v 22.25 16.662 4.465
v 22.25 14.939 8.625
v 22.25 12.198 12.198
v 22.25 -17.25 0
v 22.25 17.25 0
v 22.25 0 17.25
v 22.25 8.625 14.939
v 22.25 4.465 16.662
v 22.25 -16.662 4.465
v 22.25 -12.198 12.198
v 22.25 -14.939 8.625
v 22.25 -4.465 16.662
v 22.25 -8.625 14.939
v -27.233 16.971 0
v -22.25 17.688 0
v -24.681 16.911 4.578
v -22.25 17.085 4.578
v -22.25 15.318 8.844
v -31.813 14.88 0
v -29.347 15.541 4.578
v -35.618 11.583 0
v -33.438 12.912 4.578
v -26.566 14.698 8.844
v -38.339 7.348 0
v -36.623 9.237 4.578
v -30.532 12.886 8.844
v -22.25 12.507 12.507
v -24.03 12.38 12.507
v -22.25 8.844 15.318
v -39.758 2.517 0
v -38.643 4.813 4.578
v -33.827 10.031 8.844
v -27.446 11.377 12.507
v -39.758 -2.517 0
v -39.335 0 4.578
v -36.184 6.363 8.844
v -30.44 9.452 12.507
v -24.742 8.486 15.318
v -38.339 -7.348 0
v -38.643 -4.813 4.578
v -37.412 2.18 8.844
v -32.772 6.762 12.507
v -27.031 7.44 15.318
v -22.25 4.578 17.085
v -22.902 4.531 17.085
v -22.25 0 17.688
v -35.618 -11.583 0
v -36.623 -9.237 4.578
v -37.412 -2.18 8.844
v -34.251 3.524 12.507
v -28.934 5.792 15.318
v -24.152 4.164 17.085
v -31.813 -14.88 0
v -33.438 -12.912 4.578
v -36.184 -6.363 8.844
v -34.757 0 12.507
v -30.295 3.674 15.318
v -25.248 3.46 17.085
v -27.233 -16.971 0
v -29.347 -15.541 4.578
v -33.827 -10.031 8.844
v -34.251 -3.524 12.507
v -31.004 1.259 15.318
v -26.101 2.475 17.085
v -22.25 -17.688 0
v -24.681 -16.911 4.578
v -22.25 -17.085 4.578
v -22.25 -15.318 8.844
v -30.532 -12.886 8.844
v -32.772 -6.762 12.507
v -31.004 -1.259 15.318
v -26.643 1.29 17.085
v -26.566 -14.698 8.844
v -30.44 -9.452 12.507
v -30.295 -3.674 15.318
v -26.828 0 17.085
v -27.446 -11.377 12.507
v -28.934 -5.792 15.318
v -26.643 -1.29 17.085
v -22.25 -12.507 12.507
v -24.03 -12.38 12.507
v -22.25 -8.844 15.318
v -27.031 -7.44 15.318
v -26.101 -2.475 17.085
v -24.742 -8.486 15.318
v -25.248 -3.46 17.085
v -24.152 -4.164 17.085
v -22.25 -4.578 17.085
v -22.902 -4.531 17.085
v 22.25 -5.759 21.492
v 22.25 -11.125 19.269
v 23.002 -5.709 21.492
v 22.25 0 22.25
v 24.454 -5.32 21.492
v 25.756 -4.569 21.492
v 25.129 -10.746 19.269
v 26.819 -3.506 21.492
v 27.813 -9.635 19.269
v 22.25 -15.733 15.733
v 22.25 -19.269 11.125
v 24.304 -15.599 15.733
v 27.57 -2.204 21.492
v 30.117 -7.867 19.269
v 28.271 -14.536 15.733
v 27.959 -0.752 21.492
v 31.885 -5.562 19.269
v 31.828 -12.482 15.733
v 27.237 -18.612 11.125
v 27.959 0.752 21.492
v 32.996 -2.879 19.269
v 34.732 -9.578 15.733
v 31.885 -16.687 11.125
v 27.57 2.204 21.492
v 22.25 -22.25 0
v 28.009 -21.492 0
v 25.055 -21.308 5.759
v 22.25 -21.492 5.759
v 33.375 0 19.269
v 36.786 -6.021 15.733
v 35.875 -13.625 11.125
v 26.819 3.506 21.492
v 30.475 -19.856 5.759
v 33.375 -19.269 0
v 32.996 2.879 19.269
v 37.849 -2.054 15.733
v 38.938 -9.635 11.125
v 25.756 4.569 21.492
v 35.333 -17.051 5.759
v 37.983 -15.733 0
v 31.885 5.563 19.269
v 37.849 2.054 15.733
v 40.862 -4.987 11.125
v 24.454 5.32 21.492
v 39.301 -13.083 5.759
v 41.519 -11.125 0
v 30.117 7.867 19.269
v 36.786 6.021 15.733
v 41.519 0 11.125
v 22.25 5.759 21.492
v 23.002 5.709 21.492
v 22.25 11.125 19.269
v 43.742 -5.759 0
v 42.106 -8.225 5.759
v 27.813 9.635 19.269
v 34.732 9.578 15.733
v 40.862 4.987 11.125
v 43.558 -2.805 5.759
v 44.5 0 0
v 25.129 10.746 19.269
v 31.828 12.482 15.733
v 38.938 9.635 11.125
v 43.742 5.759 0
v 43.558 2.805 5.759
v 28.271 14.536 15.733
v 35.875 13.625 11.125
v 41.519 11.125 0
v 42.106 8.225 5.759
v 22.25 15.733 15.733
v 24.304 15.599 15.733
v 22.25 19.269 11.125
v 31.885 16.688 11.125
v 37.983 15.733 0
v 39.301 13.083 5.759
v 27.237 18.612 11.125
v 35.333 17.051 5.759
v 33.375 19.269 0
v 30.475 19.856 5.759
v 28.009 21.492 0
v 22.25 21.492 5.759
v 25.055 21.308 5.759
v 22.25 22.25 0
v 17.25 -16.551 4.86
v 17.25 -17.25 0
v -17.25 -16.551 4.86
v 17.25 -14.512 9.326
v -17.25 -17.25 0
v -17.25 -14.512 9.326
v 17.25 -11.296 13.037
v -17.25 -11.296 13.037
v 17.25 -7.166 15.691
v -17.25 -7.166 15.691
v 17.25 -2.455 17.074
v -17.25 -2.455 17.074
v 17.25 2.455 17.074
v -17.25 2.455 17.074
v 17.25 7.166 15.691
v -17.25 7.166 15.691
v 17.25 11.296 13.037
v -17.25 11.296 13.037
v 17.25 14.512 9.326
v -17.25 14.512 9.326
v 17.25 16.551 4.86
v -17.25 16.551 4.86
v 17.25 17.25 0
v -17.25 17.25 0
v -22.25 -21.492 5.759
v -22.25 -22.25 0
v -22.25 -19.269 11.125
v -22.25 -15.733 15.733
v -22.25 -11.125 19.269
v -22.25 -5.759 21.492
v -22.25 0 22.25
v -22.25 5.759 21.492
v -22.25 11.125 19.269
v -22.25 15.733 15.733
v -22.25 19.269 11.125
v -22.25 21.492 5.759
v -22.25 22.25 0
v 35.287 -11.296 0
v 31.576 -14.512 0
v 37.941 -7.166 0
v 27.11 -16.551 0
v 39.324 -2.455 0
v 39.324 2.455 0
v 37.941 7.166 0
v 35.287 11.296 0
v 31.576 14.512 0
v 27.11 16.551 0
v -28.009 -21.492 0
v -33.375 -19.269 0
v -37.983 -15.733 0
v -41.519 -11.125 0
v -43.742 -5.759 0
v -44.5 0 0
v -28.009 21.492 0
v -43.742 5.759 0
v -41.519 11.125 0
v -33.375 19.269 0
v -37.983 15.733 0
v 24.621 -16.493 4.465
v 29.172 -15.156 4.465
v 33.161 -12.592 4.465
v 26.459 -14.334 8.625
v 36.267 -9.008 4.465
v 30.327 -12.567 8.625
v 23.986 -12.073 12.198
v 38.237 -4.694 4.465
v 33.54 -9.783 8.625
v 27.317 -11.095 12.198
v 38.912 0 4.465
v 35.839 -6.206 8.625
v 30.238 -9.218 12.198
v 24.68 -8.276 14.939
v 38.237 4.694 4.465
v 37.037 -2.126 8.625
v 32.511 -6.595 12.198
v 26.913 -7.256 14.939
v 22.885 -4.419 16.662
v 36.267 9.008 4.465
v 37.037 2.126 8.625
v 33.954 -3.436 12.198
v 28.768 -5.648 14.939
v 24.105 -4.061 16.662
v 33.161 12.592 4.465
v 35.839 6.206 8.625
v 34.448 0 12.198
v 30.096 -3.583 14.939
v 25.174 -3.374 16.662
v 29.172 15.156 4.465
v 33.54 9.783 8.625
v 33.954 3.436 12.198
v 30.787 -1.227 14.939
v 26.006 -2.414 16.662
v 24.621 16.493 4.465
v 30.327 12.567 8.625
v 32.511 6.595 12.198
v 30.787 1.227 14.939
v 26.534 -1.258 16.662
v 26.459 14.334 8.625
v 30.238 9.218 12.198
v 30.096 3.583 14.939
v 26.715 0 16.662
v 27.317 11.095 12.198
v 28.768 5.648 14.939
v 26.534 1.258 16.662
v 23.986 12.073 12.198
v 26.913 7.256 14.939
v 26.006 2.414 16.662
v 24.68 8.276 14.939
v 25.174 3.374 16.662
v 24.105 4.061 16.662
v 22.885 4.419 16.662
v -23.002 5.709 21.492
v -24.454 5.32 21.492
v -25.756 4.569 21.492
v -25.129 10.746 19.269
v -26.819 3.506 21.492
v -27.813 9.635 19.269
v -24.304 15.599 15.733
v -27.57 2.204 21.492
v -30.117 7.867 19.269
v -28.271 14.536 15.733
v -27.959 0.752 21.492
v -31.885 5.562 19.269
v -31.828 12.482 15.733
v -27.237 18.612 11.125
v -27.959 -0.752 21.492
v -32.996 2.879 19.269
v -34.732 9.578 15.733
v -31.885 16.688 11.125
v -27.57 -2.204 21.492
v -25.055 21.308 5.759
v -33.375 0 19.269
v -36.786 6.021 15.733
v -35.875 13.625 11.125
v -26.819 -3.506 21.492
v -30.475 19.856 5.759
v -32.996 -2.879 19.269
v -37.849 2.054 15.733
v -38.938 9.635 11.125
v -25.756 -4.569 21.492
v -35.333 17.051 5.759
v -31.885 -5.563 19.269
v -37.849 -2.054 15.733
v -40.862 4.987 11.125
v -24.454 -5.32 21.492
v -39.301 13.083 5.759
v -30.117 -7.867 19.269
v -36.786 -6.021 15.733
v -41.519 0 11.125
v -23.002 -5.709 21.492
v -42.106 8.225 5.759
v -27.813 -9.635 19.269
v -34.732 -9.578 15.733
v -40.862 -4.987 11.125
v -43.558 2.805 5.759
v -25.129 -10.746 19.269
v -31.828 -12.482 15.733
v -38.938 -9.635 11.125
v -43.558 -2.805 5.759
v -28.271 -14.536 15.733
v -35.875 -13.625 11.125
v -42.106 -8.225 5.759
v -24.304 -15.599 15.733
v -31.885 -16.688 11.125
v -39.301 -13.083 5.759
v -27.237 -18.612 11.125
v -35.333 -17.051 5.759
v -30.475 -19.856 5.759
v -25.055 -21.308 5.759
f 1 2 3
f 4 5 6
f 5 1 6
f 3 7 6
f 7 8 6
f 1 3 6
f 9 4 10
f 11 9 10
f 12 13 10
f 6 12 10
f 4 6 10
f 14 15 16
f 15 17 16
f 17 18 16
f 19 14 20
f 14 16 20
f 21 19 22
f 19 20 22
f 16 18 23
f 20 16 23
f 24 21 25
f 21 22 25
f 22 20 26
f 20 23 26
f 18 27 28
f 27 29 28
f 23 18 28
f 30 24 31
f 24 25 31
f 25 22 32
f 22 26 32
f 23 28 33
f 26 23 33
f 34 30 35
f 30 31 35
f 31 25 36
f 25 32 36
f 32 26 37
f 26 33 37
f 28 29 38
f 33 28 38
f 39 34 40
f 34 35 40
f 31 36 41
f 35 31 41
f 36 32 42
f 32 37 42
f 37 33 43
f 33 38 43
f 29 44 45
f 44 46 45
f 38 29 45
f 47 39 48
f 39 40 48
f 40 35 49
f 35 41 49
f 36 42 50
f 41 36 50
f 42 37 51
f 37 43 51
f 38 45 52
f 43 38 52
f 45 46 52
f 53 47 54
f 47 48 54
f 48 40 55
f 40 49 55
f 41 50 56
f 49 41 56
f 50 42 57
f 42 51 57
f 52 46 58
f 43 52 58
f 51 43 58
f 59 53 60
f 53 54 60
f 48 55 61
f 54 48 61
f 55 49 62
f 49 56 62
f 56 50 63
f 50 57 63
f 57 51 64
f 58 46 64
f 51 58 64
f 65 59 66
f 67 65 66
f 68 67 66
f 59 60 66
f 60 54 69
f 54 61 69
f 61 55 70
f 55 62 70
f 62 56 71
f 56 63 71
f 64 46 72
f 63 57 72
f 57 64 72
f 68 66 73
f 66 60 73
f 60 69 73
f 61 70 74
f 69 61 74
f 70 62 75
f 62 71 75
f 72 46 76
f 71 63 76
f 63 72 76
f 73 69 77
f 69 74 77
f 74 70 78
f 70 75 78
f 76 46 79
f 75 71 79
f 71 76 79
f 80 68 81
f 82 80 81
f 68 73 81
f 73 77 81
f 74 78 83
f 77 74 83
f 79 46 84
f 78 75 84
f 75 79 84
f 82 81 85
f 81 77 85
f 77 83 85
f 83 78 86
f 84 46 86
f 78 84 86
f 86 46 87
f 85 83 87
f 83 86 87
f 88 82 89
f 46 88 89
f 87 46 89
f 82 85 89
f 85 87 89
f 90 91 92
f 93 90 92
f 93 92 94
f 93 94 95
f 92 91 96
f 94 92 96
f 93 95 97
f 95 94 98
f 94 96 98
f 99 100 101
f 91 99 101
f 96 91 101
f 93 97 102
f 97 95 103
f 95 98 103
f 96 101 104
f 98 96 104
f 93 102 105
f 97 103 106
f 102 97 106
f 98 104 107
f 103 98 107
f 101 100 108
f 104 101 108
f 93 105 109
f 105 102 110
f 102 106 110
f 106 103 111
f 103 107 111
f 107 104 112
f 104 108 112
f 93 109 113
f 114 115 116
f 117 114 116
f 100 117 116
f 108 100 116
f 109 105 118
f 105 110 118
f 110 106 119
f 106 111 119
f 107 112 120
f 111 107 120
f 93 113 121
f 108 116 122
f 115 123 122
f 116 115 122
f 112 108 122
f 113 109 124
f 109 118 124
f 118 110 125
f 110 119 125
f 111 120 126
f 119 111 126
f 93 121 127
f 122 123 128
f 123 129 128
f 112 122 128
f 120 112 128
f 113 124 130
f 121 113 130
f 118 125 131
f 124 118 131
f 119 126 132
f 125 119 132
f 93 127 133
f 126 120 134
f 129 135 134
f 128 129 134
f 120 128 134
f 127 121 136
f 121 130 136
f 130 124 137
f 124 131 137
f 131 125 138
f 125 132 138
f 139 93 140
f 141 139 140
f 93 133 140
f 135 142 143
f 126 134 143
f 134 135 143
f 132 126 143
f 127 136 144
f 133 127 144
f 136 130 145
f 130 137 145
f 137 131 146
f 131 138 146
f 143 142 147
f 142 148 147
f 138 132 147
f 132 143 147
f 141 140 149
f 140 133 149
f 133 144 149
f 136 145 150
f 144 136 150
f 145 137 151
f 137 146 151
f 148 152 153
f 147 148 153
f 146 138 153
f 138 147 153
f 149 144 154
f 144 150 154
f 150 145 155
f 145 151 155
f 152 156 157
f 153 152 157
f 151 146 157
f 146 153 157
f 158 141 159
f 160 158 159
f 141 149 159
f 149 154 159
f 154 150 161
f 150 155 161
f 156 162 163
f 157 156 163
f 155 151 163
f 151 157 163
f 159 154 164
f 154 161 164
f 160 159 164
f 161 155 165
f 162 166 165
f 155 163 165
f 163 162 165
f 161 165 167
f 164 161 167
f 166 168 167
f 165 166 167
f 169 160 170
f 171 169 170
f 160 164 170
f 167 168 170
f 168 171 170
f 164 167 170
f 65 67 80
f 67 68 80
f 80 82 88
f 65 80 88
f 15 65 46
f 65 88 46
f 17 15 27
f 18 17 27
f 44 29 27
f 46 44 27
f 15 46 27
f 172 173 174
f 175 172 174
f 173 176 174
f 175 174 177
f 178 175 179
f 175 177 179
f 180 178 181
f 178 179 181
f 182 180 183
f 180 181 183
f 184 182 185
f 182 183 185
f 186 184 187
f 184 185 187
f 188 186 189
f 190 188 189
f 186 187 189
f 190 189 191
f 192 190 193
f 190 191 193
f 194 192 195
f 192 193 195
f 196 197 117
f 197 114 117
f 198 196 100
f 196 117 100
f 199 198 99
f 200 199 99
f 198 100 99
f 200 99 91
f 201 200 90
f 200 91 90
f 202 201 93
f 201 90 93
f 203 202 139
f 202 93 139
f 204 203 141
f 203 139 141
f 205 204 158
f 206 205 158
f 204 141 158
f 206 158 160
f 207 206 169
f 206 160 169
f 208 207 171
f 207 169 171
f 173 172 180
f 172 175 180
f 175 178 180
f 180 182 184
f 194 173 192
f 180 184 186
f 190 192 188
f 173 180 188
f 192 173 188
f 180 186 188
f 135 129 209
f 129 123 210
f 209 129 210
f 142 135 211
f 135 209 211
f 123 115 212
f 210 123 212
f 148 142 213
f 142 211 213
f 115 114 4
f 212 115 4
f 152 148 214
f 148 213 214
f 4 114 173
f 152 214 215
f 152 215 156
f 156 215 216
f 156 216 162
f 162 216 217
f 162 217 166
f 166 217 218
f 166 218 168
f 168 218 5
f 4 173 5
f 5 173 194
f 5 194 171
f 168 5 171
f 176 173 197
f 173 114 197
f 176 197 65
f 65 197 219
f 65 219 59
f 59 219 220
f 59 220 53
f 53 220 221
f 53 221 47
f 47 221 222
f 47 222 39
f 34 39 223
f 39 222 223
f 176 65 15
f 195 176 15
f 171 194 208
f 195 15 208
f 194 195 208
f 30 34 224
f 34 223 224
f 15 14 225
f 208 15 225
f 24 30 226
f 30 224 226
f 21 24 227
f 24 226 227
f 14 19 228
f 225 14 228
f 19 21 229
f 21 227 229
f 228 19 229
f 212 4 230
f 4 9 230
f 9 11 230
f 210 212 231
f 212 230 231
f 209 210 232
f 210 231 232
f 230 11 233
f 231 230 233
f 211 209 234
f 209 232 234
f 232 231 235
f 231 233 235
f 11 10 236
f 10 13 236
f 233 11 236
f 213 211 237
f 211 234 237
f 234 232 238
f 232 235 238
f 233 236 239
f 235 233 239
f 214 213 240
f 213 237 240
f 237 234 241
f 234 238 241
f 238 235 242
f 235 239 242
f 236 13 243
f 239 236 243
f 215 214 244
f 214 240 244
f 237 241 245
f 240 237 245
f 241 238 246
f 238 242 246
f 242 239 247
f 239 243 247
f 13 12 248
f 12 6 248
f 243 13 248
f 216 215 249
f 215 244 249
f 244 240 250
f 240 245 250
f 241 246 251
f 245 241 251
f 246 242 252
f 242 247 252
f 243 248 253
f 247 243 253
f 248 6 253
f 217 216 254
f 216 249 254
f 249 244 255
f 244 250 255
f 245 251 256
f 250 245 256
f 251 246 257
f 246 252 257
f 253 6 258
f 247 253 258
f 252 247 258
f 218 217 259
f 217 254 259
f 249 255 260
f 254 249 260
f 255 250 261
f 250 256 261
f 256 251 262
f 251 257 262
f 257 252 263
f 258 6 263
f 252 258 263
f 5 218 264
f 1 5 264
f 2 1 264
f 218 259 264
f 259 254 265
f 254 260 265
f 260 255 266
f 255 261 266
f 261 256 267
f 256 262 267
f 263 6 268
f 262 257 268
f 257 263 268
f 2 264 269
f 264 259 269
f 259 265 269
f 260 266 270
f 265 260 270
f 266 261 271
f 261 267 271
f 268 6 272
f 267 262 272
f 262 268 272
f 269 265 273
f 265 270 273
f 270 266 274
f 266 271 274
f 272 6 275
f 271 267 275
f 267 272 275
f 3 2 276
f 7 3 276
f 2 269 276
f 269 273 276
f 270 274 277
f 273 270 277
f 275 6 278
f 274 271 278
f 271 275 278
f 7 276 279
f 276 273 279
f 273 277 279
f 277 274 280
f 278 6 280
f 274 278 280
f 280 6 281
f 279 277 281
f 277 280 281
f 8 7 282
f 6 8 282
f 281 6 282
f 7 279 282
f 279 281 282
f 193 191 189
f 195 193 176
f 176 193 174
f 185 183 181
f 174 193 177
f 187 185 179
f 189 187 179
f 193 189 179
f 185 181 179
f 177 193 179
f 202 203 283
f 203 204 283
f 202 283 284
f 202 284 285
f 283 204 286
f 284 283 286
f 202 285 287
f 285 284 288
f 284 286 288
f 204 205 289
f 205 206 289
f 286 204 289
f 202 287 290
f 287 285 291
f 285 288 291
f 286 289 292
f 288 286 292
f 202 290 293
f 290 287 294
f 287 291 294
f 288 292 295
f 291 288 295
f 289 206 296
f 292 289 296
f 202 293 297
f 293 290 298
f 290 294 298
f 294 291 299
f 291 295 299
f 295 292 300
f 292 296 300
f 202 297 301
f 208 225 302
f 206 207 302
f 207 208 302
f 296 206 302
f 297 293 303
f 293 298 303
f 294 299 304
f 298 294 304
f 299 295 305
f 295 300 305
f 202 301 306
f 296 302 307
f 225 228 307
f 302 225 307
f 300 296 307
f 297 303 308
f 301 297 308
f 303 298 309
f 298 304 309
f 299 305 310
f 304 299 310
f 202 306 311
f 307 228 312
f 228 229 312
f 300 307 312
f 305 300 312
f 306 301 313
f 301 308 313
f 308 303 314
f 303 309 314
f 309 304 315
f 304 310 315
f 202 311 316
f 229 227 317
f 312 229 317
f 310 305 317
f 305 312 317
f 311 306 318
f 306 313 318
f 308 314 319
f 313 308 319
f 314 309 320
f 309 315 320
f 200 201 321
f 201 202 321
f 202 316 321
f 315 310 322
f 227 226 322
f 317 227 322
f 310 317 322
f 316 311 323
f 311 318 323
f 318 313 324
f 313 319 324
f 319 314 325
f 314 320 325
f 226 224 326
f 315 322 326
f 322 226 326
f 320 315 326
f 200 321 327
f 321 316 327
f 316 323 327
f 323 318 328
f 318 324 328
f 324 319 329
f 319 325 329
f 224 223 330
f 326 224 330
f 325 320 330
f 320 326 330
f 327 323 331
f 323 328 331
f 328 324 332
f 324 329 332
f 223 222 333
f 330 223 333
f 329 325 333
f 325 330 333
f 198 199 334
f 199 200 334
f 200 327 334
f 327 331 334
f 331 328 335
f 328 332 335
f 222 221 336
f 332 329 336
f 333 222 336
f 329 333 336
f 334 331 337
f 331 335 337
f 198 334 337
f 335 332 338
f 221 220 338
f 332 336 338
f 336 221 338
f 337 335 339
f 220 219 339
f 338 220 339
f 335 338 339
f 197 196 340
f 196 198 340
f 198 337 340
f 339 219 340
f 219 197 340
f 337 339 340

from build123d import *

# Parameters (mm, degrees)
F1_ANGLE = 180
F3_ANGLE = 180
F5_ANGLE = 180


with BuildPart() as f1:
    # F0 (on Top) → F1 (revolve)
    with BuildSketch(Plane.XY):
        Polygon((22.25, -22.25), (22.25, 0), (17.25, 0), (17.25, -17.25), (-17.25, -17.25), (-17.25, 0), (-22.25, 0), (-22.25, -22.25), align=None)
    revolve(axis=Axis((4.6253763139, 0, 0), (-1, 0, 0)), revolution_arc=F1_ANGLE)

    # F2 (on face) → F3 (revolve)
    with BuildSketch(Plane.YZ.offset(22.25)):
        with BuildLine():
            ThreePointArc((0, 22.25), (-15.7331258814, 15.7331258814), (-22.25, 0))
            Line((-22.25, 0), (-17.25, 0))
            ThreePointArc((-17.25, 0), (-12.1975919755, 12.1975919755), (0, 17.25))
            Line((0, 17.25), (0, 22.25))
        make_face()
    revolve(axis=Axis((22.25, 0, 10.080948472), (0, 0, 1)), revolution_arc=F3_ANGLE)

    # F4 (on face) → F5 (revolve)
    with BuildSketch(Plane(origin=(-22.25, 0, 0), x_dir=(0, -1, 0), z_dir=(-1, 0, 0))):
        with BuildLine():
            ThreePointArc((0, 22.25), (-15.7331258814, 15.7331258814), (-22.25, 0))
            Line((-22.25, 0), (-17.6879018545, 0))
            ThreePointArc((-17.6879018545, 0), (-12.5072353463, 12.5072353463), (0, 17.6879018545))
            Line((0, 17.6879018545), (0, 22.25))
        make_face()
    revolve(axis=Axis((-22.25, 0, 6.120197475), (0, 0, 1)), revolution_arc=F5_ANGLE)


solid = f1.part
